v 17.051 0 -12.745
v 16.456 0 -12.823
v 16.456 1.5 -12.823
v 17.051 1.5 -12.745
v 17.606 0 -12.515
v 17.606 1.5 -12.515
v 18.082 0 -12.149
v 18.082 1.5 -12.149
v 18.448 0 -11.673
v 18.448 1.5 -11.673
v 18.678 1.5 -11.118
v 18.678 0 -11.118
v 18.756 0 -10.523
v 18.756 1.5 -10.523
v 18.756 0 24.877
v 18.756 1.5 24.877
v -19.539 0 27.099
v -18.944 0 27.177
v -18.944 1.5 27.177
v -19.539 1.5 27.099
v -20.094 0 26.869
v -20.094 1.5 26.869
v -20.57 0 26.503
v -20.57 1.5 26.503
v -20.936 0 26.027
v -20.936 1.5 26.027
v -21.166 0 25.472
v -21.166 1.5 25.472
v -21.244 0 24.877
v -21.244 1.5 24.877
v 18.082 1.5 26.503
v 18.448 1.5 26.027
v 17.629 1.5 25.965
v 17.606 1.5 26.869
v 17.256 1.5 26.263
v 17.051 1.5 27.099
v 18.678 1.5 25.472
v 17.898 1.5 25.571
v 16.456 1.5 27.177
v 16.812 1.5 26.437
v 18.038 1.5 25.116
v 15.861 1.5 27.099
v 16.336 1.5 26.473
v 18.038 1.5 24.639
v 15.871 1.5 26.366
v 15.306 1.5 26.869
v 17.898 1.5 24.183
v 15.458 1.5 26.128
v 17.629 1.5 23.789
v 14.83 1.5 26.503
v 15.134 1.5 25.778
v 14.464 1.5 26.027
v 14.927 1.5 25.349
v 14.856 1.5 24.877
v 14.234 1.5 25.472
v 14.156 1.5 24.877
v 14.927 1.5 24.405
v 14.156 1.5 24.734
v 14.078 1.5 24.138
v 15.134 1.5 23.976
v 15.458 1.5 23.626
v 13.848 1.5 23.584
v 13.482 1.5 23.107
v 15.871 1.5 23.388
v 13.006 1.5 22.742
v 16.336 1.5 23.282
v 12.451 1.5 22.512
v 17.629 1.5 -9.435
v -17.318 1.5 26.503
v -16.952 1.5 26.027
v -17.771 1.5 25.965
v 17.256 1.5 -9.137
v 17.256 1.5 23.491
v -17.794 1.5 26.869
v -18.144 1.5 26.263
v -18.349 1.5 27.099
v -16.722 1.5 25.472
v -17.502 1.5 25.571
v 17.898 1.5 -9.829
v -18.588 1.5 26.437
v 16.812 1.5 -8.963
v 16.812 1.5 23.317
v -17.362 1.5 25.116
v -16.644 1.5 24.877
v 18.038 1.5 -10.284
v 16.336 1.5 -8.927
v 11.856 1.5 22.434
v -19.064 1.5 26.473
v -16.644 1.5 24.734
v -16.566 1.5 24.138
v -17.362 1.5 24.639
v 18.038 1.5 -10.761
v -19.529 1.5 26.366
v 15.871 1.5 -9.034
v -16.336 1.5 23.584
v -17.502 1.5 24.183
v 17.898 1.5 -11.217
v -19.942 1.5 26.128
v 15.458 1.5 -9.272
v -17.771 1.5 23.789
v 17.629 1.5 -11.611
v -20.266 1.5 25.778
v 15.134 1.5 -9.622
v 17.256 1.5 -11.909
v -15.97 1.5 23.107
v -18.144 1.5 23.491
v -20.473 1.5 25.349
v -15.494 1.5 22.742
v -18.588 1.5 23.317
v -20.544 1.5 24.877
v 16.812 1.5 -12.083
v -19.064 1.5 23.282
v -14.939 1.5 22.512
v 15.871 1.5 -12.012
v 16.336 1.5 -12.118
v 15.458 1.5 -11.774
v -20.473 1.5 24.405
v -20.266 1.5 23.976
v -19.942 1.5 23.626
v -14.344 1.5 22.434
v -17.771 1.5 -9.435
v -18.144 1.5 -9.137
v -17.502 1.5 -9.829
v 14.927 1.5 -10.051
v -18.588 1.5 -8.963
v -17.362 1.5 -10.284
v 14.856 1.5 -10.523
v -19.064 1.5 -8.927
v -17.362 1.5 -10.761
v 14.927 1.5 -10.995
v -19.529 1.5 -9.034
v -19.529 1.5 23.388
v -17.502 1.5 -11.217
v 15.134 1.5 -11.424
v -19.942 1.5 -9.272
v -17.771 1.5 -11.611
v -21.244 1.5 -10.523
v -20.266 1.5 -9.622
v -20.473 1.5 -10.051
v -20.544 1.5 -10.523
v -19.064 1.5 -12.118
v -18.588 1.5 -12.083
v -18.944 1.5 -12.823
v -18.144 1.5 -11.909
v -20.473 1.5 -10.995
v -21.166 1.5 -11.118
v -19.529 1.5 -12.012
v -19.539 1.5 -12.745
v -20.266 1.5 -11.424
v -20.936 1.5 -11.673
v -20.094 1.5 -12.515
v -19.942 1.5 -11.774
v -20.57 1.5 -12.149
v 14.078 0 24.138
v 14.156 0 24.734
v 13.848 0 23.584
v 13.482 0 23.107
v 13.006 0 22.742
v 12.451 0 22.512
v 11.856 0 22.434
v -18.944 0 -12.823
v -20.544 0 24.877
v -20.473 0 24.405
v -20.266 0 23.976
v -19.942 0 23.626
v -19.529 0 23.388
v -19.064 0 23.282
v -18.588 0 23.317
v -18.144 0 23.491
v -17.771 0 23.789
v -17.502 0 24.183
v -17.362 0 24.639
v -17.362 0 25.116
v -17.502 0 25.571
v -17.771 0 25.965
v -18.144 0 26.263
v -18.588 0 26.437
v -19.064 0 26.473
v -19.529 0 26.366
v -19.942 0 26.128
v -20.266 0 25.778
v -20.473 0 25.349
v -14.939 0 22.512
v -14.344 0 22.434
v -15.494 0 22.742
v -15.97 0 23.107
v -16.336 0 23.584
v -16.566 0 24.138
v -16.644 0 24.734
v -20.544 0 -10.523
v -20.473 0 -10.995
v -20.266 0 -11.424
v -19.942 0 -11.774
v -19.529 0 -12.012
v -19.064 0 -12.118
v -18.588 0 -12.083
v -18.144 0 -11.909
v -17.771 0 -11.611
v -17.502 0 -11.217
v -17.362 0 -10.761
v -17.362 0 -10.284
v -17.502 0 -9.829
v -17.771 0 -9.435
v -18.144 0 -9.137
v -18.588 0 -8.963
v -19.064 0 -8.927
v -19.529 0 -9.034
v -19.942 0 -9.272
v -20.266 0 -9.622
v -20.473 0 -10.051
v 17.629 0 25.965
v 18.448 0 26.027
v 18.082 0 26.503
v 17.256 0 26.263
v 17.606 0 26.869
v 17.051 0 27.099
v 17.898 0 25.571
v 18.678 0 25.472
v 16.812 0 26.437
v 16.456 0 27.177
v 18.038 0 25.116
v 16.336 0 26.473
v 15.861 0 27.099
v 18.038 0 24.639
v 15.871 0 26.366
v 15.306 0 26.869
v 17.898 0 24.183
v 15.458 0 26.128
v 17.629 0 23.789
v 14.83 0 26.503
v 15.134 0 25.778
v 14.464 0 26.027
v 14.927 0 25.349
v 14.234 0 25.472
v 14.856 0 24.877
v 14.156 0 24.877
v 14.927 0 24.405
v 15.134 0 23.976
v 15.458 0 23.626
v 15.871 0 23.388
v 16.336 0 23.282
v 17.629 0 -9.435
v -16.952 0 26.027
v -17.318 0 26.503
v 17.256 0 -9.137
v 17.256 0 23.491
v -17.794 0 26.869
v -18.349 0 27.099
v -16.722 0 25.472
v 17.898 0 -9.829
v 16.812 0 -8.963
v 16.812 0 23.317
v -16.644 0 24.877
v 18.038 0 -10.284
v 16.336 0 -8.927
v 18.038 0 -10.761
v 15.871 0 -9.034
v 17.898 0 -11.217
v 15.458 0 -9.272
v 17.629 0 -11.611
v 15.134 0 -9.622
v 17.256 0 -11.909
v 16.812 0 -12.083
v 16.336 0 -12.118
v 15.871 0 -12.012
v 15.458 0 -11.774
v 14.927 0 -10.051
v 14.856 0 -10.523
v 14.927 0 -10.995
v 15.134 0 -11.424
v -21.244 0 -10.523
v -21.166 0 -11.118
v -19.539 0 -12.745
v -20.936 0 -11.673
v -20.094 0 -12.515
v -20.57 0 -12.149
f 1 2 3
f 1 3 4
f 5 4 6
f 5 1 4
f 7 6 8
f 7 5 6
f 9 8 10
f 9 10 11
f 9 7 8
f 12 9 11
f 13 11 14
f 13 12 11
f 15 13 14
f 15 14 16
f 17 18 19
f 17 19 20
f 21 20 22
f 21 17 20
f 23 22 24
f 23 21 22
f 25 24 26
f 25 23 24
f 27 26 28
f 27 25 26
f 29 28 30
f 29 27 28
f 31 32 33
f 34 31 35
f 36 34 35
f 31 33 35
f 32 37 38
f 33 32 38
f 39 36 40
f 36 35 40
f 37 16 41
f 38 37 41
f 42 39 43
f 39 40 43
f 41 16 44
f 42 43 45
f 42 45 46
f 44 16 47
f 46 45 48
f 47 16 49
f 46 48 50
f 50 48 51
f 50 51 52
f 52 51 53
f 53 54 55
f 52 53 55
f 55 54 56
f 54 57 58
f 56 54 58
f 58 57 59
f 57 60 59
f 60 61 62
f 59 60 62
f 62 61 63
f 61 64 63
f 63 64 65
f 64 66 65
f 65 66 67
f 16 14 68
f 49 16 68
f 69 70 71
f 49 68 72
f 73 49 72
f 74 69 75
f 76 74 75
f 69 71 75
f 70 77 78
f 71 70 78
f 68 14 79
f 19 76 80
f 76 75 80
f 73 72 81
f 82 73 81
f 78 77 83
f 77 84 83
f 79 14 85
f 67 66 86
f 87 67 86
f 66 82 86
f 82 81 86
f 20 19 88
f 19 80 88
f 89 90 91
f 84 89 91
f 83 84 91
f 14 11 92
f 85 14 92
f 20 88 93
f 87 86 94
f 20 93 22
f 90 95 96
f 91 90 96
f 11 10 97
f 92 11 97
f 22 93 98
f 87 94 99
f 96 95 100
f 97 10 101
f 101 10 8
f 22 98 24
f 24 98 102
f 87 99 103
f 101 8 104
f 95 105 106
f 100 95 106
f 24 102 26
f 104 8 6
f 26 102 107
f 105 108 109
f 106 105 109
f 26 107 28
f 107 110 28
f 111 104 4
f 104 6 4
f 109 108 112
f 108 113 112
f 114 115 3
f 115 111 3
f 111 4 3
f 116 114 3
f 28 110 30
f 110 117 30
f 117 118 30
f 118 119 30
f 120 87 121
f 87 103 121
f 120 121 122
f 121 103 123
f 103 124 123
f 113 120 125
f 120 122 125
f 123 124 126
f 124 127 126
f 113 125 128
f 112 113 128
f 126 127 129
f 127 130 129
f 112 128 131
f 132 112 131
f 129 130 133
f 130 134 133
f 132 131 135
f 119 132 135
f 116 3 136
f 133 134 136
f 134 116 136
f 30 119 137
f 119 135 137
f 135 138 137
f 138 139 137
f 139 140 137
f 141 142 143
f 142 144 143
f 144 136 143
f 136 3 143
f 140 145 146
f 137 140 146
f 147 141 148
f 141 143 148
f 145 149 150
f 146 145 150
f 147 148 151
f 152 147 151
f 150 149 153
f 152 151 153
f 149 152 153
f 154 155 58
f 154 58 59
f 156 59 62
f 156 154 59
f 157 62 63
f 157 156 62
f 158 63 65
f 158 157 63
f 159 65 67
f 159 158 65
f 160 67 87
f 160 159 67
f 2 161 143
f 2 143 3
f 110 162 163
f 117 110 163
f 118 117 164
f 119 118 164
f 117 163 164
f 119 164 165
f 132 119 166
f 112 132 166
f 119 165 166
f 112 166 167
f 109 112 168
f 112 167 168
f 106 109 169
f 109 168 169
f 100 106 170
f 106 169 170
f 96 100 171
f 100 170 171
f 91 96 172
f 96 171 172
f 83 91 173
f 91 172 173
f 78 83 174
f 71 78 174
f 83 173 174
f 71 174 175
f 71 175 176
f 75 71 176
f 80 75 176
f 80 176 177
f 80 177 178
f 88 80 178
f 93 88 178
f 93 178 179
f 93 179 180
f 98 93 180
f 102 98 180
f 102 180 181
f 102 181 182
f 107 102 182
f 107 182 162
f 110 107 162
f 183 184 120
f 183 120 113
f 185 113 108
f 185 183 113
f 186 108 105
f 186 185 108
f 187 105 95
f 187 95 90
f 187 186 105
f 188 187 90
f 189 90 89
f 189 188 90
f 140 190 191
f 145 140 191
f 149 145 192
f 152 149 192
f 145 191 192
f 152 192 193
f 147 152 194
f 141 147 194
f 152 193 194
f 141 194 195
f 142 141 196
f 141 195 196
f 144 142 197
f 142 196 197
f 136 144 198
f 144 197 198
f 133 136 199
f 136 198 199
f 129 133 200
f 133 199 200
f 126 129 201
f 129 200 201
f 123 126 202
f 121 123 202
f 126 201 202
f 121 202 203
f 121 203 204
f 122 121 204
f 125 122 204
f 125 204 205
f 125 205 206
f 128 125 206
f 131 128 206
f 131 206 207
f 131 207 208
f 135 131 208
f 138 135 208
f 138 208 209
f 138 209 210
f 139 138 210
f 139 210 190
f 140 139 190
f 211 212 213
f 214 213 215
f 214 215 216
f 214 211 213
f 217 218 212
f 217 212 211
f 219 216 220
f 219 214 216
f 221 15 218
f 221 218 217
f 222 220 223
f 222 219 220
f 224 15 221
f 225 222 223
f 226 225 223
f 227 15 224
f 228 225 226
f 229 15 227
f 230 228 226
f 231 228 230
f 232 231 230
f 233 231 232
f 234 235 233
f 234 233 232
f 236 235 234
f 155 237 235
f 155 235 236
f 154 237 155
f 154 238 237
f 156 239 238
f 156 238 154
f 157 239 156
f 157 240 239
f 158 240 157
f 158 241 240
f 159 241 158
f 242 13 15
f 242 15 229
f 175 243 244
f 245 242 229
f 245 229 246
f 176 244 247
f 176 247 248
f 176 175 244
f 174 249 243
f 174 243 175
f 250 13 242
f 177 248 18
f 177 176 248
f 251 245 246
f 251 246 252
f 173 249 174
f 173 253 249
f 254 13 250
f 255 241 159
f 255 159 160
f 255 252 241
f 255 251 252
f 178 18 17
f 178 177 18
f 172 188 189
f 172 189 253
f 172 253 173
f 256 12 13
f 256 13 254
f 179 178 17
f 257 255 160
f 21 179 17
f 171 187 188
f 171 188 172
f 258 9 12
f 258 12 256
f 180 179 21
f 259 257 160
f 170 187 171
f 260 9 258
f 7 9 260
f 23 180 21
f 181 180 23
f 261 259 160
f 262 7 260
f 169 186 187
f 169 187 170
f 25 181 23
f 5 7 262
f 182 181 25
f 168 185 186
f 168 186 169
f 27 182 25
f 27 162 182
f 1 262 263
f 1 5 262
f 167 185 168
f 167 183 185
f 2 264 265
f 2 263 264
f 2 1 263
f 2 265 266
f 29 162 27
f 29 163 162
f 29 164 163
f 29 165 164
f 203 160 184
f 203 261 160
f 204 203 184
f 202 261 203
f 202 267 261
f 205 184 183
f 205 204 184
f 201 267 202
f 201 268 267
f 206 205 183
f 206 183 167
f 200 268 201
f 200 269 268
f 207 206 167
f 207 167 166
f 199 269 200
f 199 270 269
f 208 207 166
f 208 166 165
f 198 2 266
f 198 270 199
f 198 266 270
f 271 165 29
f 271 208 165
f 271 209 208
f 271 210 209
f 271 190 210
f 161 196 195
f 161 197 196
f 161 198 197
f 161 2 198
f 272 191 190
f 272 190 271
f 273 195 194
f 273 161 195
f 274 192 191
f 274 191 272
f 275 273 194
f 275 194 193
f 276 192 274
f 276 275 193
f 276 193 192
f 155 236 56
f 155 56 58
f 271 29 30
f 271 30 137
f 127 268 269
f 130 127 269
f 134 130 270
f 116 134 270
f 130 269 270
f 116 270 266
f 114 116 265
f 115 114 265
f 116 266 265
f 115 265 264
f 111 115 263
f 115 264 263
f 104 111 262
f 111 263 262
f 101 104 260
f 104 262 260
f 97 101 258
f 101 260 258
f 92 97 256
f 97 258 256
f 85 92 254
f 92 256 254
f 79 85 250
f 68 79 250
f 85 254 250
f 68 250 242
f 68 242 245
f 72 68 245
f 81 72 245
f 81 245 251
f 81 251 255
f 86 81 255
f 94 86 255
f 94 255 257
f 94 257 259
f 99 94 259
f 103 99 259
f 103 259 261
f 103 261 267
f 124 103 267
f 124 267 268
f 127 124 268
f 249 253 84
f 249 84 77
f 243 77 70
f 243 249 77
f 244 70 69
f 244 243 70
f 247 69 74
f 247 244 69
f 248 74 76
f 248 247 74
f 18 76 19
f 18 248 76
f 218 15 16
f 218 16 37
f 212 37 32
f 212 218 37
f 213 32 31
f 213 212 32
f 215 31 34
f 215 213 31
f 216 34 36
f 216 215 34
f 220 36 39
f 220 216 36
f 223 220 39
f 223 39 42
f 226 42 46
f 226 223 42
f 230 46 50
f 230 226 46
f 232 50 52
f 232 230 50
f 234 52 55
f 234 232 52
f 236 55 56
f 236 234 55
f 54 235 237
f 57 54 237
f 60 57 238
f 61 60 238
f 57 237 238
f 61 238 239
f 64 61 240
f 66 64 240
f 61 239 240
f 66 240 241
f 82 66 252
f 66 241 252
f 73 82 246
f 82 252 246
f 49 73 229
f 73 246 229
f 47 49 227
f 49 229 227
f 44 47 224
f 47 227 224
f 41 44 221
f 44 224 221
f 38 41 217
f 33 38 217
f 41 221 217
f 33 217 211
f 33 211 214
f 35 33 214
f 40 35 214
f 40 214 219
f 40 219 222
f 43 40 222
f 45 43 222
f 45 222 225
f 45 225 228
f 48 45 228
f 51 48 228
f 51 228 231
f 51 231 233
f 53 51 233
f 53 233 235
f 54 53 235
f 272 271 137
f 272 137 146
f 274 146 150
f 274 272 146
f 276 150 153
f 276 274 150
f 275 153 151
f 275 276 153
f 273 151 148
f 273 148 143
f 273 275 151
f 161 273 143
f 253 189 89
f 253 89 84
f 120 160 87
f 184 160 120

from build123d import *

# Parameters (mm, degrees)
BOSS_EXTRUDE1_DEPTH        = 1.5
F_3_2_3_2_DIAMETER_HOLE1_D = 3.2


with BuildPart() as part:
    # Sketch1 → Boss-Extrude1 (new body)
    with BuildSketch(Plane(origin=(0, 0, 0), x_dir=(1, 0, 0), z_dir=(0, 1, 0))):
        with BuildLine():
            Line((-18.944019139, 12.822966507), (16.455980861, 12.822966507))
            ThreePointArc((16.455980861, 12.822966507), (18.082326458, 12.149312104), (18.755980861, 10.522966507))
            Line((18.755980861, 10.522966507), (18.755980861, -24.877033493))
            ThreePointArc((18.755980861, -24.877033493), (18.082326458, -26.50337909), (16.455980861, -27.177033493))
            ThreePointArc((16.455980861, -27.177033493), (14.829635265, -26.50337909), (14.155980861, -24.877033493))
            Line((14.155980861, -24.877033493), (14.155980861, -24.733717149))
            ThreePointArc((14.155980861, -24.733717149), (13.482326458, -23.107371553), (11.855980861, -22.433717149))
            Line((11.855980861, -22.433717149), (-14.344019139, -22.433717149))
            ThreePointArc((-14.344019139, -22.433717149), (-15.970364735, -23.107371553), (-16.644019139, -24.733717149))
            Line((-16.644019139, -24.733717149), (-16.644019139, -24.877033493))
            ThreePointArc((-16.644019139, -24.877033493), (-17.317673542, -26.50337909), (-18.944019139, -27.177033493))
            ThreePointArc((-18.944019139, -27.177033493), (-20.570364735, -26.50337909), (-21.244019139, -24.877033493))
            Line((-21.244019139, -24.877033493), (-21.244019139, 10.522966507))
            ThreePointArc((-21.244019139, 10.522966507), (-20.570364735, 12.149312104), (-18.944019139, 12.822966507))
        make_face()
    extrude(amount=BOSS_EXTRUDE1_DEPTH)

    # Ø3.2 (3.2) Diameter Hole1 (through all)
    with Locations(Plane(origin=(0, 1.5, 0), x_dir=(1, 0, 0), z_dir=(0, 1, 0))):
        with Locations((-18.944019139, 10.522966507), (16.455980861, 10.522966507), (16.455980861, -24.877033493), (-18.944019139, -24.877033493)):
            Hole(F_3_2_3_2_DIAMETER_HOLE1_D / 2)


solid = part.part
